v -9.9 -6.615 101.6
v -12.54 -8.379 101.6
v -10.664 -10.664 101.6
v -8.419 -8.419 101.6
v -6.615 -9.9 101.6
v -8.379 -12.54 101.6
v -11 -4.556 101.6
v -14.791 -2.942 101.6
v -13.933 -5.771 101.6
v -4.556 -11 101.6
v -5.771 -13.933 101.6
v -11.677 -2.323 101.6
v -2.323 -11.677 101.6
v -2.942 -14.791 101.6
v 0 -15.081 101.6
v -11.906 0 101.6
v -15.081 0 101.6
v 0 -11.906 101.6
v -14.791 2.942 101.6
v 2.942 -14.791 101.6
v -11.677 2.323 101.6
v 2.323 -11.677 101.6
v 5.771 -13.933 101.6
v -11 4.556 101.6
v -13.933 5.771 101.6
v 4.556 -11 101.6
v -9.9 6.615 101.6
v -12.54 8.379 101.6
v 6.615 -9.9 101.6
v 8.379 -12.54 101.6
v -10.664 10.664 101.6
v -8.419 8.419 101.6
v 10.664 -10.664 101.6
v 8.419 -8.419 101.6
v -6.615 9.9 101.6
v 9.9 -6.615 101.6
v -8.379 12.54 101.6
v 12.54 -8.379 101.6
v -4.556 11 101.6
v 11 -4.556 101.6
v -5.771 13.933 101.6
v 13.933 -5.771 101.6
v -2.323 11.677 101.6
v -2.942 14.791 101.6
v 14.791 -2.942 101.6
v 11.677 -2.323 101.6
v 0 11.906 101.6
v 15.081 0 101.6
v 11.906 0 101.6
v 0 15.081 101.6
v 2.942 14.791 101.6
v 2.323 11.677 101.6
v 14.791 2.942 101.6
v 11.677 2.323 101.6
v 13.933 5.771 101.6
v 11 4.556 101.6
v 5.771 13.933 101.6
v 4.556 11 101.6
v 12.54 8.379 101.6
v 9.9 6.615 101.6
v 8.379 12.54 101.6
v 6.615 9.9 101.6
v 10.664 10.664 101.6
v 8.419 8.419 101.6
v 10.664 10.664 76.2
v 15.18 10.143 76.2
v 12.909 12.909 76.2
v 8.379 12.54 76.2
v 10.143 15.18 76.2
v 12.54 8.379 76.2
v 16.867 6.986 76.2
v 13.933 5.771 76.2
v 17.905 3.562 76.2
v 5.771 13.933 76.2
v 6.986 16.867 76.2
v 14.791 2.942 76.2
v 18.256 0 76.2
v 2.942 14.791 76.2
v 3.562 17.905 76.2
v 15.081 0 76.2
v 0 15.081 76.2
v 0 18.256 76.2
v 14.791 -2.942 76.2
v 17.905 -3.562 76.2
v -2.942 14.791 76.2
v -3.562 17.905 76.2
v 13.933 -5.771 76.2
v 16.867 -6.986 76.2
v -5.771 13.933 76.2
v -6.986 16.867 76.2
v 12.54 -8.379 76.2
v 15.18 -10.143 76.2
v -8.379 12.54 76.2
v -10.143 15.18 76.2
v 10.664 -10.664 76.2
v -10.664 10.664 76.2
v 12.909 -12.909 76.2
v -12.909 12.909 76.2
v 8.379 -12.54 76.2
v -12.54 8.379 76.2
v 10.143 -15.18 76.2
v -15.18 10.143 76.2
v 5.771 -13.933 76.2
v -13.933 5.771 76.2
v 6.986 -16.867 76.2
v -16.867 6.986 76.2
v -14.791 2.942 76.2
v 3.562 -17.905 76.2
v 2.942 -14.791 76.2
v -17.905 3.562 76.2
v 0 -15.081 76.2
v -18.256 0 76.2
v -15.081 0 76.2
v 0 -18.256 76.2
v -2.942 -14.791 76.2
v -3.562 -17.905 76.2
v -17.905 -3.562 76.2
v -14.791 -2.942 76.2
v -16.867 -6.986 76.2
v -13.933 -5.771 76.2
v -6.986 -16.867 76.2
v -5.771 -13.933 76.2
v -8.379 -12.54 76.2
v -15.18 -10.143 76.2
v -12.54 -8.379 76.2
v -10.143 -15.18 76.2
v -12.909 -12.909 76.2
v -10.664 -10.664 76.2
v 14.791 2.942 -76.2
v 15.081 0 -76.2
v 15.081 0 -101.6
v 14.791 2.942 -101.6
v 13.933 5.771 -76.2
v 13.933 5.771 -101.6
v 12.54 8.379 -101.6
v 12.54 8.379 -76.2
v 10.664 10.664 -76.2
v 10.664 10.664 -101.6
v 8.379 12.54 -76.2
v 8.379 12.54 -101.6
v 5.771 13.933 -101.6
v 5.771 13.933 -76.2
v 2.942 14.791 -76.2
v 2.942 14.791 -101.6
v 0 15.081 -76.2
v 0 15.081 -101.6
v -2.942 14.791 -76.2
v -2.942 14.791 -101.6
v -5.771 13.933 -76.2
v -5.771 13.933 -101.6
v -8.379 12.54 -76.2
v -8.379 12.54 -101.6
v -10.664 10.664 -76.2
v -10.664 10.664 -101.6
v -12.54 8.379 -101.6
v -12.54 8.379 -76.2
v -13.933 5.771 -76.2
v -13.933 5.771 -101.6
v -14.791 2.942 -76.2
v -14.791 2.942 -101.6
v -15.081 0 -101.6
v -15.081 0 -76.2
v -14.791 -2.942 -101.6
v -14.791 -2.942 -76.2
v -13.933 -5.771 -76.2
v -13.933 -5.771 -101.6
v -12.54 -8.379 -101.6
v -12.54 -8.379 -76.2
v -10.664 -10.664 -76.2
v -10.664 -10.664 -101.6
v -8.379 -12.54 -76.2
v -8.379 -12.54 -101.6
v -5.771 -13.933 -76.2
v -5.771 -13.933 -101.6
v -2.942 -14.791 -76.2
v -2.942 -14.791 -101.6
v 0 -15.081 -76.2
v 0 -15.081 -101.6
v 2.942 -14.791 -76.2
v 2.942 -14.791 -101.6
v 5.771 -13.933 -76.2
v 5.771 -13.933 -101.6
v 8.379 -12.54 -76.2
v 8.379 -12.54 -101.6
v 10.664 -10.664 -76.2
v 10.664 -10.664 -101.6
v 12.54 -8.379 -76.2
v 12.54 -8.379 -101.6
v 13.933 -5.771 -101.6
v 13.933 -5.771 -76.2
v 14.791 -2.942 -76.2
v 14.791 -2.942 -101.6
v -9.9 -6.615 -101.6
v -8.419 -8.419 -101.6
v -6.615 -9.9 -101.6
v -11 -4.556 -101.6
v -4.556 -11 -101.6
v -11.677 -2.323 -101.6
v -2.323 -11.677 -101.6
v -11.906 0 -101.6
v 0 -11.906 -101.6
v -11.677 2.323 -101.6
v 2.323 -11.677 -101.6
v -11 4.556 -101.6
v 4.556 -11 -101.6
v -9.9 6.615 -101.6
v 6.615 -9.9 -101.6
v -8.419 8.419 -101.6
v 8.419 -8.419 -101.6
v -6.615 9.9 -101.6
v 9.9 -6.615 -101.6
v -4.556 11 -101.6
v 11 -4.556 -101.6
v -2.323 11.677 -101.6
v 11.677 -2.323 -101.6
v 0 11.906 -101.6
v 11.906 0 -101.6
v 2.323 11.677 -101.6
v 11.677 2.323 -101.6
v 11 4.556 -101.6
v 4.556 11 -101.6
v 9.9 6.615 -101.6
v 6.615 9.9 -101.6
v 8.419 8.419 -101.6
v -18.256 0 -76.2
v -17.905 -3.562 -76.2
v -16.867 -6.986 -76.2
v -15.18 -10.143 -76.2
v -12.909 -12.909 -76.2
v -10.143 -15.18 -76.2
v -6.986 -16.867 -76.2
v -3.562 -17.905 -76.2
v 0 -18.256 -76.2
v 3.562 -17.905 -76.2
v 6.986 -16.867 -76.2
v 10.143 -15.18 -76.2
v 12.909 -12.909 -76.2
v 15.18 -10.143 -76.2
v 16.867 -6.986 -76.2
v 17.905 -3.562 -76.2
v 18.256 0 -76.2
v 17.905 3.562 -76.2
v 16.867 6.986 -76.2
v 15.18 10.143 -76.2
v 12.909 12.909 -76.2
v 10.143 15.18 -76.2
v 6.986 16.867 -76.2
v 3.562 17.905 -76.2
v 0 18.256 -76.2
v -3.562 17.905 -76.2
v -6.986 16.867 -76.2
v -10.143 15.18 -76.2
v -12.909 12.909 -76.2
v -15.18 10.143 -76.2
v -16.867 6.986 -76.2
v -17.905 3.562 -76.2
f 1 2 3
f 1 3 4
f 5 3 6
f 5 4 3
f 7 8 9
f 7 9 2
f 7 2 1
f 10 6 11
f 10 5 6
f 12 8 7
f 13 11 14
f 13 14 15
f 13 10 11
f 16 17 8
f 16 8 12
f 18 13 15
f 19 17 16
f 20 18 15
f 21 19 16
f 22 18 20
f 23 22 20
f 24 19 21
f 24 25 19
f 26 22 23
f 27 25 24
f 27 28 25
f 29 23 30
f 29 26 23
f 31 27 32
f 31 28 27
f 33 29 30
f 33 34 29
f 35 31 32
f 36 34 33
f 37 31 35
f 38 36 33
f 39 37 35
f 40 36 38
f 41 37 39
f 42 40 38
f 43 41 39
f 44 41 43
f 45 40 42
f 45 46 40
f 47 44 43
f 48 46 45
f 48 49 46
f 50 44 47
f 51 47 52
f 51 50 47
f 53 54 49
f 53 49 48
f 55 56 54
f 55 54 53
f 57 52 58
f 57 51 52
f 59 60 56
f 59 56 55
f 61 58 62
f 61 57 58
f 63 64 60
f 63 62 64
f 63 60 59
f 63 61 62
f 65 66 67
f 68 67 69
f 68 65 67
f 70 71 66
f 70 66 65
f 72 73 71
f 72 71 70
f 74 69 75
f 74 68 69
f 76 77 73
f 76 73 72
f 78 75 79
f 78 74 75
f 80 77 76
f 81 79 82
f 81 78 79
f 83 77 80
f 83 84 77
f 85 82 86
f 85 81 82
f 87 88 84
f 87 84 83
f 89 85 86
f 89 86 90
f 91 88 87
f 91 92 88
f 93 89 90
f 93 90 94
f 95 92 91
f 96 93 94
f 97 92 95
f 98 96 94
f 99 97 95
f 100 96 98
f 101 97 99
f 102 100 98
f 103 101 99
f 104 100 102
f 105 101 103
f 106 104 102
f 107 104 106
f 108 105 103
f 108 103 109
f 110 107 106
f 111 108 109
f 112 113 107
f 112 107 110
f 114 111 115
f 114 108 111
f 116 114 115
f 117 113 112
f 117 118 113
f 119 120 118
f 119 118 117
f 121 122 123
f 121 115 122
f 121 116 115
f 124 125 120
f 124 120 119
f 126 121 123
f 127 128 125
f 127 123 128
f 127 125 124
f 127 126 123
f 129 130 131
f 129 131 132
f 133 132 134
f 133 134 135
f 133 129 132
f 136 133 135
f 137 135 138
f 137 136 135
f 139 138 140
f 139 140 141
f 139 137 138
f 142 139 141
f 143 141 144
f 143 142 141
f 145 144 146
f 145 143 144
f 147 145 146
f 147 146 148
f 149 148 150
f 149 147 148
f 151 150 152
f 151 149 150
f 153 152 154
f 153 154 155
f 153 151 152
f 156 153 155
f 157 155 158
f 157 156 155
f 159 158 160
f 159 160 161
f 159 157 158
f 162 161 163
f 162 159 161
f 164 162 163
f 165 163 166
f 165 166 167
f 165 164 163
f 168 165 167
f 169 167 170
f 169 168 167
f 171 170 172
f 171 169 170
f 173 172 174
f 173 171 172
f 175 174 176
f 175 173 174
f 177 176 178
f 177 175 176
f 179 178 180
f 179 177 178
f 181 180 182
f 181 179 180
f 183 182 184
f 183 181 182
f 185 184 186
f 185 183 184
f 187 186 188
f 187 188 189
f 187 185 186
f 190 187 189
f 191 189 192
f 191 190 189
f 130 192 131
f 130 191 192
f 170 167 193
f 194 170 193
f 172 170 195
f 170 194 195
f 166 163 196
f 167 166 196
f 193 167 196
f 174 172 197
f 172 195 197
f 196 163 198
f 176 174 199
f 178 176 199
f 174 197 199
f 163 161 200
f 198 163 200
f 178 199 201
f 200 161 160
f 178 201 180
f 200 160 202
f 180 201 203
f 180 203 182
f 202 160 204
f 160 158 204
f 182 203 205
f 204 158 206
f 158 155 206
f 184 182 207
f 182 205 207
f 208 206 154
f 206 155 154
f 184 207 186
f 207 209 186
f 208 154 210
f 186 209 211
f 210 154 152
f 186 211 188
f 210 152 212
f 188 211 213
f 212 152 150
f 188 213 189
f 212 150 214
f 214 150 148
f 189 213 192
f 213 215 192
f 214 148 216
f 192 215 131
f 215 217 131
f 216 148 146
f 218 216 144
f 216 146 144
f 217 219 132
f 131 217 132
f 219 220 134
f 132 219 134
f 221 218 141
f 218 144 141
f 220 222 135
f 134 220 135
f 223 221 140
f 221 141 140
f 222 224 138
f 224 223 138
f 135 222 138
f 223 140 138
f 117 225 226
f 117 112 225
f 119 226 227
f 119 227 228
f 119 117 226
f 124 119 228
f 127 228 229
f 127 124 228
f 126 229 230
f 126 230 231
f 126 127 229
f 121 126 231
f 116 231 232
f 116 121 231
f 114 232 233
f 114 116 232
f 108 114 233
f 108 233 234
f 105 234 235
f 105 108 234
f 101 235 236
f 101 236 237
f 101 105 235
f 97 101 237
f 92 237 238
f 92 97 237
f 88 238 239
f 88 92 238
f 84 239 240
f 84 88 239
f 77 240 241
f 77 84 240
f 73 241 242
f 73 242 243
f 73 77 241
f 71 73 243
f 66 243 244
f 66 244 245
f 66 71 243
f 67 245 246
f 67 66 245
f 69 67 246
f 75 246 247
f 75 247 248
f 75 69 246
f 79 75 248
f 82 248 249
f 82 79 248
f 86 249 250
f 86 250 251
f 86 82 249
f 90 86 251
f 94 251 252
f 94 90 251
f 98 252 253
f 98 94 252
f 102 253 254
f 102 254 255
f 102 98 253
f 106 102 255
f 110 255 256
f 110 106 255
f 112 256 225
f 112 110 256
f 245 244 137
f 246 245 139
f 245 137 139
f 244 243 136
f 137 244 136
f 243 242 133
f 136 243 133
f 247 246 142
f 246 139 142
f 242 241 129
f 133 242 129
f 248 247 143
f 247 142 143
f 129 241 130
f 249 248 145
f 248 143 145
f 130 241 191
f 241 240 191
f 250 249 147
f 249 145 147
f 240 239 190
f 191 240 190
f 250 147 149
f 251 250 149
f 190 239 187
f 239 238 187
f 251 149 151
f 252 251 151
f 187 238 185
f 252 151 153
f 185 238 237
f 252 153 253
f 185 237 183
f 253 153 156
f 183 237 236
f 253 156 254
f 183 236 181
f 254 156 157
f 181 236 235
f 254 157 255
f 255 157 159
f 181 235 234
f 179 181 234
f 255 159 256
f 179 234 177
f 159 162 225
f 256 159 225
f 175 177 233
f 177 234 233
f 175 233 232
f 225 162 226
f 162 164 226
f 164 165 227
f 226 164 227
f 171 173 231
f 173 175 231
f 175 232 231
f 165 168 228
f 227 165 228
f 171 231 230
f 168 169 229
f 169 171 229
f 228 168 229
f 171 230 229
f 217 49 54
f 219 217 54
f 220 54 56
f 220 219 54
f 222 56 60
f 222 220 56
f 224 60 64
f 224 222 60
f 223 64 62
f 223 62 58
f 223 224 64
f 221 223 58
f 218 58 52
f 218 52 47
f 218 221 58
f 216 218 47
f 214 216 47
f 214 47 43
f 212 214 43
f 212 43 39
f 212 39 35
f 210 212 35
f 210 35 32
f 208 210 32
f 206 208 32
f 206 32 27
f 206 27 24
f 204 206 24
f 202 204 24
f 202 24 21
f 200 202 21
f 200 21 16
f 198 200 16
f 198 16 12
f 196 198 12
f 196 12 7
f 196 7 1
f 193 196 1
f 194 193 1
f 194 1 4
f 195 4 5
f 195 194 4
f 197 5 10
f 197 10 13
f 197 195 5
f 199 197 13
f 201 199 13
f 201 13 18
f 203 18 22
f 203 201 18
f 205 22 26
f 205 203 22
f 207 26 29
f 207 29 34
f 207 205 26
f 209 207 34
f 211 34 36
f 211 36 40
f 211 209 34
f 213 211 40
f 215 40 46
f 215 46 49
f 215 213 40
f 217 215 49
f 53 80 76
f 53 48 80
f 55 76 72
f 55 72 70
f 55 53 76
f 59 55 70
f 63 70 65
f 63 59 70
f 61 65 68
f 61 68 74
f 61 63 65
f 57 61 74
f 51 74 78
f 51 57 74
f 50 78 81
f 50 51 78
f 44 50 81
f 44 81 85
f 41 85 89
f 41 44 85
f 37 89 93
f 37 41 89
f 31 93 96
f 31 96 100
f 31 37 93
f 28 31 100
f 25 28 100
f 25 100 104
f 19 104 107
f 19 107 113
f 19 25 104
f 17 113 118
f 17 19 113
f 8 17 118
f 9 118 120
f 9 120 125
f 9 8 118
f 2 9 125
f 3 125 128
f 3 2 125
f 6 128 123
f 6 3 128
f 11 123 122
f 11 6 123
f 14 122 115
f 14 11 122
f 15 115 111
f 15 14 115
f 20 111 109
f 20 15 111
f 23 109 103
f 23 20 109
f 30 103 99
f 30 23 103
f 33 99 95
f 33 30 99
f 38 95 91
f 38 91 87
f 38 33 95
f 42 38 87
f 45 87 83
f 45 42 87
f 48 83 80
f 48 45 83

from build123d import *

# Parameters (mm, degrees)
SKETCH1_R           = 15.08125
SKETCH1_R_2         = 11.90625
BOSS_EXTRUDE1_DEPTH = 101.6
SKETCH2_R           = 18.25625
SKETCH2_R_2         = 11.90625
BOSS_EXTRUDE2_DEPTH = 76.2


with BuildPart() as part:
    # Sketch1 → Boss-Extrude1 (new, symmetric)
    with BuildSketch(Plane.XY):
        Circle(SKETCH1_R)
        Circle(SKETCH1_R_2, mode=Mode.SUBTRACT)
    extrude(amount=BOSS_EXTRUDE1_DEPTH, both=True)

    # Sketch2 → Boss-Extrude2 (add, symmetric)
    with BuildSketch(Plane.XY):
        with Locations(Location((0, 0, 0), (0, 0, 180))):
            Circle(SKETCH2_R)
        Circle(SKETCH2_R_2, mode=Mode.SUBTRACT)
    extrude(amount=BOSS_EXTRUDE2_DEPTH, both=True)


solid = part.part
